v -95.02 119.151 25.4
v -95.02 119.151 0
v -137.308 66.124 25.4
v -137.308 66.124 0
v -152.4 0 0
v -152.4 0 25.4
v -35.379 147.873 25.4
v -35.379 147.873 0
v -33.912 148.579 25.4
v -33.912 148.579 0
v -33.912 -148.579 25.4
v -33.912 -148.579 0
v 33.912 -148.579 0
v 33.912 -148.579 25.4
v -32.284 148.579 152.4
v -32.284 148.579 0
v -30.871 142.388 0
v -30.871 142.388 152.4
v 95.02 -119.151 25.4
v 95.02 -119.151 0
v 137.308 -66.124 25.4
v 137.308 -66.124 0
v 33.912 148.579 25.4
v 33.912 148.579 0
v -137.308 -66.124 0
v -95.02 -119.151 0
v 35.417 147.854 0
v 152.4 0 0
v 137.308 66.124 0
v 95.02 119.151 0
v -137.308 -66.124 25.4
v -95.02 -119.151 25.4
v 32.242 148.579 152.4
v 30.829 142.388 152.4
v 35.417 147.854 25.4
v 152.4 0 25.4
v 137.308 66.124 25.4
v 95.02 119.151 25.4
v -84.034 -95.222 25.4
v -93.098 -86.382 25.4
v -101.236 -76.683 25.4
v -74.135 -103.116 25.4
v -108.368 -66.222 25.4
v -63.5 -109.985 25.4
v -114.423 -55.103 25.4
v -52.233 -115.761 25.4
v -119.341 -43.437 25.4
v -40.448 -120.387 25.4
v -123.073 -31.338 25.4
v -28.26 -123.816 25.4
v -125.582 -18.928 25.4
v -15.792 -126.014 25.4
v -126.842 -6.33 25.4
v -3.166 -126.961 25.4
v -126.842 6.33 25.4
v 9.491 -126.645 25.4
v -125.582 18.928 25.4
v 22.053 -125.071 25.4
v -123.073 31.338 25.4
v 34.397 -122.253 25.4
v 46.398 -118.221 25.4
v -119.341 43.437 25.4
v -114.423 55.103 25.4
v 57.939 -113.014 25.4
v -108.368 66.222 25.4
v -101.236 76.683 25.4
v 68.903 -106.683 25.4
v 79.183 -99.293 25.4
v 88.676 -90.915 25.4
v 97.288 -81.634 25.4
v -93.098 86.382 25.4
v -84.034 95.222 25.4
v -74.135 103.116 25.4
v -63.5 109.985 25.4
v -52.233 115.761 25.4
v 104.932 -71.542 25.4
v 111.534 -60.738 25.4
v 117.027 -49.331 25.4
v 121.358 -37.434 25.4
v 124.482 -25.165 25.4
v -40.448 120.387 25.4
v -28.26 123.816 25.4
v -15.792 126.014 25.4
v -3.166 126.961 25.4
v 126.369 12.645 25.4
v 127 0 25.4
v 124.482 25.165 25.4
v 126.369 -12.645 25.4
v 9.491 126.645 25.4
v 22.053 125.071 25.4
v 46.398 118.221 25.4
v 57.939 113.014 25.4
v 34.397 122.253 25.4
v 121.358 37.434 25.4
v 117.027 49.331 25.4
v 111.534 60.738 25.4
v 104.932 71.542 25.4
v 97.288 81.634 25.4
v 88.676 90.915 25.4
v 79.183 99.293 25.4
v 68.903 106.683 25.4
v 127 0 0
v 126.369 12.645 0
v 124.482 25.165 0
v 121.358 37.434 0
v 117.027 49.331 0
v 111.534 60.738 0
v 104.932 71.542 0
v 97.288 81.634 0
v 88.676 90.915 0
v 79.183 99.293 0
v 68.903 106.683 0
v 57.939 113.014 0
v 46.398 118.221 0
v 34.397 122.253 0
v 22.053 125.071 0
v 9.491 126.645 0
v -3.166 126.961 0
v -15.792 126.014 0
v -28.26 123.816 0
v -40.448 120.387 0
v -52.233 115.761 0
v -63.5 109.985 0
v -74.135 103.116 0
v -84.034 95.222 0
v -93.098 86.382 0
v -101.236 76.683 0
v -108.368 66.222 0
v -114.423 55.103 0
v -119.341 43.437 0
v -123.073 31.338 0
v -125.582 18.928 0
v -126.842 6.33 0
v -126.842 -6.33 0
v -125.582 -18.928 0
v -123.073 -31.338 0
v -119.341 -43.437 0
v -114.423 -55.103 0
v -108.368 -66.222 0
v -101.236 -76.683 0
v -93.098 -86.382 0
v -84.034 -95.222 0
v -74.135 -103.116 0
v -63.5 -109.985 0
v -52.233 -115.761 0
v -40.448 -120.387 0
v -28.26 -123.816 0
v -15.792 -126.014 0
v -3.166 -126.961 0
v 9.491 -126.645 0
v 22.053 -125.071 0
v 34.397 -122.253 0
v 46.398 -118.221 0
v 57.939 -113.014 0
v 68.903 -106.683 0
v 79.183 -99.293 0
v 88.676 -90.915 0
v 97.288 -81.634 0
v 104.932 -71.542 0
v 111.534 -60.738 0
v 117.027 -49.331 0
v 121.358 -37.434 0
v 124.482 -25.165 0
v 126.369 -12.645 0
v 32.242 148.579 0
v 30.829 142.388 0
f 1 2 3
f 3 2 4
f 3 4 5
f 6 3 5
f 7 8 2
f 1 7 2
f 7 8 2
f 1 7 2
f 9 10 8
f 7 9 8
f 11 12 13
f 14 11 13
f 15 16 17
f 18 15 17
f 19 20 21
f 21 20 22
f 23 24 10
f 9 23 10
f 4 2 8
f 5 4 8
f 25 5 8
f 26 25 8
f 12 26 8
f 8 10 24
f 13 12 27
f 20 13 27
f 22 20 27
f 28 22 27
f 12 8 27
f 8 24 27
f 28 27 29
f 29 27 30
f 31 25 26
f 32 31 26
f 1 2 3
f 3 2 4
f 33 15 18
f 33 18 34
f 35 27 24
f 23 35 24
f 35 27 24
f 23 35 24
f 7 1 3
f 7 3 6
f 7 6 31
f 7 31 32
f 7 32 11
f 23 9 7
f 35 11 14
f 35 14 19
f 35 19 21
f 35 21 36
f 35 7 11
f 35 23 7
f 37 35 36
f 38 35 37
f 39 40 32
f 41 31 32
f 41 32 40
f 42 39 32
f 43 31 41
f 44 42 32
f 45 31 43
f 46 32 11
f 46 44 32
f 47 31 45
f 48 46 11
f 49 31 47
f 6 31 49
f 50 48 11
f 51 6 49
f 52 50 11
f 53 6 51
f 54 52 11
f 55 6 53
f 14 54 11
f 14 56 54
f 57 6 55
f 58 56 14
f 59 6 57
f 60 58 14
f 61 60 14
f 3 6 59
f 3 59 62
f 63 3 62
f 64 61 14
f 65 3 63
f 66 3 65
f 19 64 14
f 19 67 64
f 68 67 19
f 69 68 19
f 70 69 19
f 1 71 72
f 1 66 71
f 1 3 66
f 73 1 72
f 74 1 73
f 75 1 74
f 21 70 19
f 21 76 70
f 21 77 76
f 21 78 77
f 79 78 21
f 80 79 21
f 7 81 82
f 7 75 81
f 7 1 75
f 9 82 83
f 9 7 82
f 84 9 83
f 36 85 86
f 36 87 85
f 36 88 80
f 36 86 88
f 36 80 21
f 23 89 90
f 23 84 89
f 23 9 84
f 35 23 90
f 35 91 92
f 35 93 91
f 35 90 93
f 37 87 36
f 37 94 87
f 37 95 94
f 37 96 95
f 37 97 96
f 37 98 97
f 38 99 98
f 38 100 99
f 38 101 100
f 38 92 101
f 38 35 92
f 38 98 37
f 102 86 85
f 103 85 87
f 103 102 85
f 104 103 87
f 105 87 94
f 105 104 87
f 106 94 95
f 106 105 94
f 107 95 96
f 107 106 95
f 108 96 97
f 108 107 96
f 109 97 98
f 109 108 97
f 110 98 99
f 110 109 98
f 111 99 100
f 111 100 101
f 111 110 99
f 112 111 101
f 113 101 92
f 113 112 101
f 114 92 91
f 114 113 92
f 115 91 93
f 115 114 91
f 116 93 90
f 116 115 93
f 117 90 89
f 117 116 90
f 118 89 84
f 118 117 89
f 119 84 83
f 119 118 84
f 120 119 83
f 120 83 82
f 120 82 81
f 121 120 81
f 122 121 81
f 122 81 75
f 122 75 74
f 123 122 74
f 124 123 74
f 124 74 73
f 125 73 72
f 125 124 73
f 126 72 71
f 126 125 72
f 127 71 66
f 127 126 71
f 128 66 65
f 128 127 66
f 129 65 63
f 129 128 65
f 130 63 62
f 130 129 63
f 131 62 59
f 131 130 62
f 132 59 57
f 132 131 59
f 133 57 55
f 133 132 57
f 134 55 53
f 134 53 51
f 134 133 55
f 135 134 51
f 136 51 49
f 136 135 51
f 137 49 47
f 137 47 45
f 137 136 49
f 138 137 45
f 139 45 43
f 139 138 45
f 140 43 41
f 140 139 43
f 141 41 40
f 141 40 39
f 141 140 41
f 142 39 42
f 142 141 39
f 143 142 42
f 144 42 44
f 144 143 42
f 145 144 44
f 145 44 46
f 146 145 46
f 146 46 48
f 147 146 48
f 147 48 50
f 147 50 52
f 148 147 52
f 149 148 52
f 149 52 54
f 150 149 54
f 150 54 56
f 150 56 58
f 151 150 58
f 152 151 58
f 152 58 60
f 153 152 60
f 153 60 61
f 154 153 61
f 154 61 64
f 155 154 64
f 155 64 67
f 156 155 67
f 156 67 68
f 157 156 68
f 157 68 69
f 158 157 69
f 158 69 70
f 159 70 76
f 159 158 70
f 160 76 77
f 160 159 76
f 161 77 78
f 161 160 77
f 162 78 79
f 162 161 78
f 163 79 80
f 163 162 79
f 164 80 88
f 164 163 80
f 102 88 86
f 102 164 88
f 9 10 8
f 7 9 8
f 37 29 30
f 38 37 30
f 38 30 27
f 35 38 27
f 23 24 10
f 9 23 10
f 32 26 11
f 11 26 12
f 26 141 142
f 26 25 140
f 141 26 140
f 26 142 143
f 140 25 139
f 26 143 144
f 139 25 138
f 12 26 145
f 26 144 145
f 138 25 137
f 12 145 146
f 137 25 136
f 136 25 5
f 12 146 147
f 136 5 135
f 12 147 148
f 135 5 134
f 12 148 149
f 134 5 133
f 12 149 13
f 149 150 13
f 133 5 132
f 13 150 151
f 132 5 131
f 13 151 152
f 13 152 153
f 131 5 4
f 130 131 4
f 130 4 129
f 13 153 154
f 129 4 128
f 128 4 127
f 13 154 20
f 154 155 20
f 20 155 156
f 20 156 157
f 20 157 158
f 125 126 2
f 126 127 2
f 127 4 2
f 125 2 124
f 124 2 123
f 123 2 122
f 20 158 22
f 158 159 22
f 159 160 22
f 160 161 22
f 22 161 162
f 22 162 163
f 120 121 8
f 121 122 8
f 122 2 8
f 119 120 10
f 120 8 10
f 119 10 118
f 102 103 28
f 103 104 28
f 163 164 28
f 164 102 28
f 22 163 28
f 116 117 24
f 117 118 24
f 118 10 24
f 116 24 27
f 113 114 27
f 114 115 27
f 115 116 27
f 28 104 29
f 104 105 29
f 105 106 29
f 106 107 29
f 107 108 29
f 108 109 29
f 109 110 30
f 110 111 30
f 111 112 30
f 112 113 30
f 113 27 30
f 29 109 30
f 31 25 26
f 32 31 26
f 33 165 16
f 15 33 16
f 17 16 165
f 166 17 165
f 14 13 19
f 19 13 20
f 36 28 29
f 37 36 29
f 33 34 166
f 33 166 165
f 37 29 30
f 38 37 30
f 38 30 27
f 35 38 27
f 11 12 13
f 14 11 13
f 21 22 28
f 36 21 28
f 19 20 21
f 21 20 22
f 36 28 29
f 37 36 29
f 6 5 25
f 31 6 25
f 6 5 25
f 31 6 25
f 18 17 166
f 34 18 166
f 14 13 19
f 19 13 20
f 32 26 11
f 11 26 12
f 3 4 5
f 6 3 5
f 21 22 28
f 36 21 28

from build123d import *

# Parameters (mm, degrees)
F0_R     = 127
F1_DEPTH = 25.4
F2_DEPTH = 152.4
F3_DEPTH = 25.4


with BuildPart() as f1:
    # F0 (on Top) → F1 (new body)
    with BuildSketch(Plane.XY):
        Polygon((30.828981, 142.388222), (32.241989, 148.579014), (-32.283865, 148.579014), (-30.870857, 142.388222), align=None)
        Polygon((95.019846, -119.151118), (137.307655, -66.123882), (152.4, 0), (137.307655, 66.123882), (95.019846, 119.151118), (35.416989, 147.854341), (34.003981, 141.663549), (91.060686, 114.186488), (131.586503, 63.36872), (146.05, 0), (131.586503, -63.36872), (91.060686, -114.186488), (32.499182, -142.388222), (-32.499182, -142.388222), (-91.060686, -114.186488), (-131.586503, -63.36872), (-146.05, 0), (-131.586503, 63.36872), (-91.060686, 114.186488), (-33.966253, 141.681718), (-35.379261, 147.87251), (-95.019846, 119.151118), (-137.307655, 66.123882), (-152.4, 0), (-137.307655, -66.123882), (-95.019846, -119.151118), (-33.91219, -148.579014), (33.91219, -148.579014), align=None)
        Polygon((91.060686, 114.186488), (34.003981, 141.663549), (32.499182, 142.388222), (30.828981, 142.388222), (-30.870857, 142.388222), (-32.499182, 142.388222), (-33.966253, 141.681718), (-91.060686, 114.186488), (-131.586503, 63.36872), (-146.05, 0), (-131.586503, -63.36872), (-91.060686, -114.186488), (-32.499182, -142.388222), (32.499182, -142.388222), (91.060686, -114.186488), (131.586503, -63.36872), (146.05, 0), (131.586503, 63.36872), align=None)
        Circle(F0_R, mode=Mode.SUBTRACT)
        Polygon((34.003981, 141.663549), (35.416989, 147.854341), (33.91219, 148.579014), (32.241989, 148.579014), (30.828981, 142.388222), (32.499182, 142.388222), align=None)
        Polygon((-30.870857, 142.388222), (-32.283865, 148.579014), (-33.91219, 148.579014), (-35.379261, 147.87251), (-33.966253, 141.681718), (-32.499182, 142.388222), align=None)
        Circle(F0_R)
    extrude(amount=F1_DEPTH)


with BuildPart() as f2:
    # F0 (on Top) → F2 (new body)
    with BuildSketch(Plane.XY):
        Polygon((30.828981, 142.388222), (32.241989, 148.579014), (-32.283865, 148.579014), (-30.870857, 142.388222), align=None)
    extrude(amount=F2_DEPTH)


with BuildPart() as f3:
    # F0 (on Top) → F3 (new body)
    with BuildSketch(Plane.XY):
        Polygon((91.060686, 114.186488), (34.003981, 141.663549), (32.499182, 142.388222), (30.828981, 142.388222), (-30.870857, 142.388222), (-32.499182, 142.388222), (-33.966253, 141.681718), (-91.060686, 114.186488), (-131.586503, 63.36872), (-146.05, 0), (-131.586503, -63.36872), (-91.060686, -114.186488), (-32.499182, -142.388222), (32.499182, -142.388222), (91.060686, -114.186488), (131.586503, -63.36872), (146.05, 0), (131.586503, 63.36872), align=None)
        Circle(F0_R, mode=Mode.SUBTRACT)
        Polygon((95.019846, -119.151118), (137.307655, -66.123882), (152.4, 0), (137.307655, 66.123882), (95.019846, 119.151118), (35.416989, 147.854341), (34.003981, 141.663549), (91.060686, 114.186488), (131.586503, 63.36872), (146.05, 0), (131.586503, -63.36872), (91.060686, -114.186488), (32.499182, -142.388222), (-32.499182, -142.388222), (-91.060686, -114.186488), (-131.586503, -63.36872), (-146.05, 0), (-131.586503, 63.36872), (-91.060686, 114.186488), (-33.966253, 141.681718), (-35.379261, 147.87251), (-95.019846, 119.151118), (-137.307655, 66.123882), (-152.4, 0), (-137.307655, -66.123882), (-95.019846, -119.151118), (-33.91219, -148.579014), (33.91219, -148.579014), align=None)
        Polygon((30.828981, 142.388222), (32.241989, 148.579014), (-32.283865, 148.579014), (-30.870857, 142.388222), align=None)
        Polygon((34.003981, 141.663549), (35.416989, 147.854341), (33.91219, 148.579014), (32.241989, 148.579014), (30.828981, 142.388222), (32.499182, 142.388222), align=None)
        Polygon((-30.870857, 142.388222), (-32.283865, 148.579014), (-33.91219, 148.579014), (-35.379261, 147.87251), (-33.966253, 141.681718), (-32.499182, 142.388222), align=None)
    extrude(amount=F3_DEPTH)


solid = Compound([f1.part, f2.part, f3.part])
